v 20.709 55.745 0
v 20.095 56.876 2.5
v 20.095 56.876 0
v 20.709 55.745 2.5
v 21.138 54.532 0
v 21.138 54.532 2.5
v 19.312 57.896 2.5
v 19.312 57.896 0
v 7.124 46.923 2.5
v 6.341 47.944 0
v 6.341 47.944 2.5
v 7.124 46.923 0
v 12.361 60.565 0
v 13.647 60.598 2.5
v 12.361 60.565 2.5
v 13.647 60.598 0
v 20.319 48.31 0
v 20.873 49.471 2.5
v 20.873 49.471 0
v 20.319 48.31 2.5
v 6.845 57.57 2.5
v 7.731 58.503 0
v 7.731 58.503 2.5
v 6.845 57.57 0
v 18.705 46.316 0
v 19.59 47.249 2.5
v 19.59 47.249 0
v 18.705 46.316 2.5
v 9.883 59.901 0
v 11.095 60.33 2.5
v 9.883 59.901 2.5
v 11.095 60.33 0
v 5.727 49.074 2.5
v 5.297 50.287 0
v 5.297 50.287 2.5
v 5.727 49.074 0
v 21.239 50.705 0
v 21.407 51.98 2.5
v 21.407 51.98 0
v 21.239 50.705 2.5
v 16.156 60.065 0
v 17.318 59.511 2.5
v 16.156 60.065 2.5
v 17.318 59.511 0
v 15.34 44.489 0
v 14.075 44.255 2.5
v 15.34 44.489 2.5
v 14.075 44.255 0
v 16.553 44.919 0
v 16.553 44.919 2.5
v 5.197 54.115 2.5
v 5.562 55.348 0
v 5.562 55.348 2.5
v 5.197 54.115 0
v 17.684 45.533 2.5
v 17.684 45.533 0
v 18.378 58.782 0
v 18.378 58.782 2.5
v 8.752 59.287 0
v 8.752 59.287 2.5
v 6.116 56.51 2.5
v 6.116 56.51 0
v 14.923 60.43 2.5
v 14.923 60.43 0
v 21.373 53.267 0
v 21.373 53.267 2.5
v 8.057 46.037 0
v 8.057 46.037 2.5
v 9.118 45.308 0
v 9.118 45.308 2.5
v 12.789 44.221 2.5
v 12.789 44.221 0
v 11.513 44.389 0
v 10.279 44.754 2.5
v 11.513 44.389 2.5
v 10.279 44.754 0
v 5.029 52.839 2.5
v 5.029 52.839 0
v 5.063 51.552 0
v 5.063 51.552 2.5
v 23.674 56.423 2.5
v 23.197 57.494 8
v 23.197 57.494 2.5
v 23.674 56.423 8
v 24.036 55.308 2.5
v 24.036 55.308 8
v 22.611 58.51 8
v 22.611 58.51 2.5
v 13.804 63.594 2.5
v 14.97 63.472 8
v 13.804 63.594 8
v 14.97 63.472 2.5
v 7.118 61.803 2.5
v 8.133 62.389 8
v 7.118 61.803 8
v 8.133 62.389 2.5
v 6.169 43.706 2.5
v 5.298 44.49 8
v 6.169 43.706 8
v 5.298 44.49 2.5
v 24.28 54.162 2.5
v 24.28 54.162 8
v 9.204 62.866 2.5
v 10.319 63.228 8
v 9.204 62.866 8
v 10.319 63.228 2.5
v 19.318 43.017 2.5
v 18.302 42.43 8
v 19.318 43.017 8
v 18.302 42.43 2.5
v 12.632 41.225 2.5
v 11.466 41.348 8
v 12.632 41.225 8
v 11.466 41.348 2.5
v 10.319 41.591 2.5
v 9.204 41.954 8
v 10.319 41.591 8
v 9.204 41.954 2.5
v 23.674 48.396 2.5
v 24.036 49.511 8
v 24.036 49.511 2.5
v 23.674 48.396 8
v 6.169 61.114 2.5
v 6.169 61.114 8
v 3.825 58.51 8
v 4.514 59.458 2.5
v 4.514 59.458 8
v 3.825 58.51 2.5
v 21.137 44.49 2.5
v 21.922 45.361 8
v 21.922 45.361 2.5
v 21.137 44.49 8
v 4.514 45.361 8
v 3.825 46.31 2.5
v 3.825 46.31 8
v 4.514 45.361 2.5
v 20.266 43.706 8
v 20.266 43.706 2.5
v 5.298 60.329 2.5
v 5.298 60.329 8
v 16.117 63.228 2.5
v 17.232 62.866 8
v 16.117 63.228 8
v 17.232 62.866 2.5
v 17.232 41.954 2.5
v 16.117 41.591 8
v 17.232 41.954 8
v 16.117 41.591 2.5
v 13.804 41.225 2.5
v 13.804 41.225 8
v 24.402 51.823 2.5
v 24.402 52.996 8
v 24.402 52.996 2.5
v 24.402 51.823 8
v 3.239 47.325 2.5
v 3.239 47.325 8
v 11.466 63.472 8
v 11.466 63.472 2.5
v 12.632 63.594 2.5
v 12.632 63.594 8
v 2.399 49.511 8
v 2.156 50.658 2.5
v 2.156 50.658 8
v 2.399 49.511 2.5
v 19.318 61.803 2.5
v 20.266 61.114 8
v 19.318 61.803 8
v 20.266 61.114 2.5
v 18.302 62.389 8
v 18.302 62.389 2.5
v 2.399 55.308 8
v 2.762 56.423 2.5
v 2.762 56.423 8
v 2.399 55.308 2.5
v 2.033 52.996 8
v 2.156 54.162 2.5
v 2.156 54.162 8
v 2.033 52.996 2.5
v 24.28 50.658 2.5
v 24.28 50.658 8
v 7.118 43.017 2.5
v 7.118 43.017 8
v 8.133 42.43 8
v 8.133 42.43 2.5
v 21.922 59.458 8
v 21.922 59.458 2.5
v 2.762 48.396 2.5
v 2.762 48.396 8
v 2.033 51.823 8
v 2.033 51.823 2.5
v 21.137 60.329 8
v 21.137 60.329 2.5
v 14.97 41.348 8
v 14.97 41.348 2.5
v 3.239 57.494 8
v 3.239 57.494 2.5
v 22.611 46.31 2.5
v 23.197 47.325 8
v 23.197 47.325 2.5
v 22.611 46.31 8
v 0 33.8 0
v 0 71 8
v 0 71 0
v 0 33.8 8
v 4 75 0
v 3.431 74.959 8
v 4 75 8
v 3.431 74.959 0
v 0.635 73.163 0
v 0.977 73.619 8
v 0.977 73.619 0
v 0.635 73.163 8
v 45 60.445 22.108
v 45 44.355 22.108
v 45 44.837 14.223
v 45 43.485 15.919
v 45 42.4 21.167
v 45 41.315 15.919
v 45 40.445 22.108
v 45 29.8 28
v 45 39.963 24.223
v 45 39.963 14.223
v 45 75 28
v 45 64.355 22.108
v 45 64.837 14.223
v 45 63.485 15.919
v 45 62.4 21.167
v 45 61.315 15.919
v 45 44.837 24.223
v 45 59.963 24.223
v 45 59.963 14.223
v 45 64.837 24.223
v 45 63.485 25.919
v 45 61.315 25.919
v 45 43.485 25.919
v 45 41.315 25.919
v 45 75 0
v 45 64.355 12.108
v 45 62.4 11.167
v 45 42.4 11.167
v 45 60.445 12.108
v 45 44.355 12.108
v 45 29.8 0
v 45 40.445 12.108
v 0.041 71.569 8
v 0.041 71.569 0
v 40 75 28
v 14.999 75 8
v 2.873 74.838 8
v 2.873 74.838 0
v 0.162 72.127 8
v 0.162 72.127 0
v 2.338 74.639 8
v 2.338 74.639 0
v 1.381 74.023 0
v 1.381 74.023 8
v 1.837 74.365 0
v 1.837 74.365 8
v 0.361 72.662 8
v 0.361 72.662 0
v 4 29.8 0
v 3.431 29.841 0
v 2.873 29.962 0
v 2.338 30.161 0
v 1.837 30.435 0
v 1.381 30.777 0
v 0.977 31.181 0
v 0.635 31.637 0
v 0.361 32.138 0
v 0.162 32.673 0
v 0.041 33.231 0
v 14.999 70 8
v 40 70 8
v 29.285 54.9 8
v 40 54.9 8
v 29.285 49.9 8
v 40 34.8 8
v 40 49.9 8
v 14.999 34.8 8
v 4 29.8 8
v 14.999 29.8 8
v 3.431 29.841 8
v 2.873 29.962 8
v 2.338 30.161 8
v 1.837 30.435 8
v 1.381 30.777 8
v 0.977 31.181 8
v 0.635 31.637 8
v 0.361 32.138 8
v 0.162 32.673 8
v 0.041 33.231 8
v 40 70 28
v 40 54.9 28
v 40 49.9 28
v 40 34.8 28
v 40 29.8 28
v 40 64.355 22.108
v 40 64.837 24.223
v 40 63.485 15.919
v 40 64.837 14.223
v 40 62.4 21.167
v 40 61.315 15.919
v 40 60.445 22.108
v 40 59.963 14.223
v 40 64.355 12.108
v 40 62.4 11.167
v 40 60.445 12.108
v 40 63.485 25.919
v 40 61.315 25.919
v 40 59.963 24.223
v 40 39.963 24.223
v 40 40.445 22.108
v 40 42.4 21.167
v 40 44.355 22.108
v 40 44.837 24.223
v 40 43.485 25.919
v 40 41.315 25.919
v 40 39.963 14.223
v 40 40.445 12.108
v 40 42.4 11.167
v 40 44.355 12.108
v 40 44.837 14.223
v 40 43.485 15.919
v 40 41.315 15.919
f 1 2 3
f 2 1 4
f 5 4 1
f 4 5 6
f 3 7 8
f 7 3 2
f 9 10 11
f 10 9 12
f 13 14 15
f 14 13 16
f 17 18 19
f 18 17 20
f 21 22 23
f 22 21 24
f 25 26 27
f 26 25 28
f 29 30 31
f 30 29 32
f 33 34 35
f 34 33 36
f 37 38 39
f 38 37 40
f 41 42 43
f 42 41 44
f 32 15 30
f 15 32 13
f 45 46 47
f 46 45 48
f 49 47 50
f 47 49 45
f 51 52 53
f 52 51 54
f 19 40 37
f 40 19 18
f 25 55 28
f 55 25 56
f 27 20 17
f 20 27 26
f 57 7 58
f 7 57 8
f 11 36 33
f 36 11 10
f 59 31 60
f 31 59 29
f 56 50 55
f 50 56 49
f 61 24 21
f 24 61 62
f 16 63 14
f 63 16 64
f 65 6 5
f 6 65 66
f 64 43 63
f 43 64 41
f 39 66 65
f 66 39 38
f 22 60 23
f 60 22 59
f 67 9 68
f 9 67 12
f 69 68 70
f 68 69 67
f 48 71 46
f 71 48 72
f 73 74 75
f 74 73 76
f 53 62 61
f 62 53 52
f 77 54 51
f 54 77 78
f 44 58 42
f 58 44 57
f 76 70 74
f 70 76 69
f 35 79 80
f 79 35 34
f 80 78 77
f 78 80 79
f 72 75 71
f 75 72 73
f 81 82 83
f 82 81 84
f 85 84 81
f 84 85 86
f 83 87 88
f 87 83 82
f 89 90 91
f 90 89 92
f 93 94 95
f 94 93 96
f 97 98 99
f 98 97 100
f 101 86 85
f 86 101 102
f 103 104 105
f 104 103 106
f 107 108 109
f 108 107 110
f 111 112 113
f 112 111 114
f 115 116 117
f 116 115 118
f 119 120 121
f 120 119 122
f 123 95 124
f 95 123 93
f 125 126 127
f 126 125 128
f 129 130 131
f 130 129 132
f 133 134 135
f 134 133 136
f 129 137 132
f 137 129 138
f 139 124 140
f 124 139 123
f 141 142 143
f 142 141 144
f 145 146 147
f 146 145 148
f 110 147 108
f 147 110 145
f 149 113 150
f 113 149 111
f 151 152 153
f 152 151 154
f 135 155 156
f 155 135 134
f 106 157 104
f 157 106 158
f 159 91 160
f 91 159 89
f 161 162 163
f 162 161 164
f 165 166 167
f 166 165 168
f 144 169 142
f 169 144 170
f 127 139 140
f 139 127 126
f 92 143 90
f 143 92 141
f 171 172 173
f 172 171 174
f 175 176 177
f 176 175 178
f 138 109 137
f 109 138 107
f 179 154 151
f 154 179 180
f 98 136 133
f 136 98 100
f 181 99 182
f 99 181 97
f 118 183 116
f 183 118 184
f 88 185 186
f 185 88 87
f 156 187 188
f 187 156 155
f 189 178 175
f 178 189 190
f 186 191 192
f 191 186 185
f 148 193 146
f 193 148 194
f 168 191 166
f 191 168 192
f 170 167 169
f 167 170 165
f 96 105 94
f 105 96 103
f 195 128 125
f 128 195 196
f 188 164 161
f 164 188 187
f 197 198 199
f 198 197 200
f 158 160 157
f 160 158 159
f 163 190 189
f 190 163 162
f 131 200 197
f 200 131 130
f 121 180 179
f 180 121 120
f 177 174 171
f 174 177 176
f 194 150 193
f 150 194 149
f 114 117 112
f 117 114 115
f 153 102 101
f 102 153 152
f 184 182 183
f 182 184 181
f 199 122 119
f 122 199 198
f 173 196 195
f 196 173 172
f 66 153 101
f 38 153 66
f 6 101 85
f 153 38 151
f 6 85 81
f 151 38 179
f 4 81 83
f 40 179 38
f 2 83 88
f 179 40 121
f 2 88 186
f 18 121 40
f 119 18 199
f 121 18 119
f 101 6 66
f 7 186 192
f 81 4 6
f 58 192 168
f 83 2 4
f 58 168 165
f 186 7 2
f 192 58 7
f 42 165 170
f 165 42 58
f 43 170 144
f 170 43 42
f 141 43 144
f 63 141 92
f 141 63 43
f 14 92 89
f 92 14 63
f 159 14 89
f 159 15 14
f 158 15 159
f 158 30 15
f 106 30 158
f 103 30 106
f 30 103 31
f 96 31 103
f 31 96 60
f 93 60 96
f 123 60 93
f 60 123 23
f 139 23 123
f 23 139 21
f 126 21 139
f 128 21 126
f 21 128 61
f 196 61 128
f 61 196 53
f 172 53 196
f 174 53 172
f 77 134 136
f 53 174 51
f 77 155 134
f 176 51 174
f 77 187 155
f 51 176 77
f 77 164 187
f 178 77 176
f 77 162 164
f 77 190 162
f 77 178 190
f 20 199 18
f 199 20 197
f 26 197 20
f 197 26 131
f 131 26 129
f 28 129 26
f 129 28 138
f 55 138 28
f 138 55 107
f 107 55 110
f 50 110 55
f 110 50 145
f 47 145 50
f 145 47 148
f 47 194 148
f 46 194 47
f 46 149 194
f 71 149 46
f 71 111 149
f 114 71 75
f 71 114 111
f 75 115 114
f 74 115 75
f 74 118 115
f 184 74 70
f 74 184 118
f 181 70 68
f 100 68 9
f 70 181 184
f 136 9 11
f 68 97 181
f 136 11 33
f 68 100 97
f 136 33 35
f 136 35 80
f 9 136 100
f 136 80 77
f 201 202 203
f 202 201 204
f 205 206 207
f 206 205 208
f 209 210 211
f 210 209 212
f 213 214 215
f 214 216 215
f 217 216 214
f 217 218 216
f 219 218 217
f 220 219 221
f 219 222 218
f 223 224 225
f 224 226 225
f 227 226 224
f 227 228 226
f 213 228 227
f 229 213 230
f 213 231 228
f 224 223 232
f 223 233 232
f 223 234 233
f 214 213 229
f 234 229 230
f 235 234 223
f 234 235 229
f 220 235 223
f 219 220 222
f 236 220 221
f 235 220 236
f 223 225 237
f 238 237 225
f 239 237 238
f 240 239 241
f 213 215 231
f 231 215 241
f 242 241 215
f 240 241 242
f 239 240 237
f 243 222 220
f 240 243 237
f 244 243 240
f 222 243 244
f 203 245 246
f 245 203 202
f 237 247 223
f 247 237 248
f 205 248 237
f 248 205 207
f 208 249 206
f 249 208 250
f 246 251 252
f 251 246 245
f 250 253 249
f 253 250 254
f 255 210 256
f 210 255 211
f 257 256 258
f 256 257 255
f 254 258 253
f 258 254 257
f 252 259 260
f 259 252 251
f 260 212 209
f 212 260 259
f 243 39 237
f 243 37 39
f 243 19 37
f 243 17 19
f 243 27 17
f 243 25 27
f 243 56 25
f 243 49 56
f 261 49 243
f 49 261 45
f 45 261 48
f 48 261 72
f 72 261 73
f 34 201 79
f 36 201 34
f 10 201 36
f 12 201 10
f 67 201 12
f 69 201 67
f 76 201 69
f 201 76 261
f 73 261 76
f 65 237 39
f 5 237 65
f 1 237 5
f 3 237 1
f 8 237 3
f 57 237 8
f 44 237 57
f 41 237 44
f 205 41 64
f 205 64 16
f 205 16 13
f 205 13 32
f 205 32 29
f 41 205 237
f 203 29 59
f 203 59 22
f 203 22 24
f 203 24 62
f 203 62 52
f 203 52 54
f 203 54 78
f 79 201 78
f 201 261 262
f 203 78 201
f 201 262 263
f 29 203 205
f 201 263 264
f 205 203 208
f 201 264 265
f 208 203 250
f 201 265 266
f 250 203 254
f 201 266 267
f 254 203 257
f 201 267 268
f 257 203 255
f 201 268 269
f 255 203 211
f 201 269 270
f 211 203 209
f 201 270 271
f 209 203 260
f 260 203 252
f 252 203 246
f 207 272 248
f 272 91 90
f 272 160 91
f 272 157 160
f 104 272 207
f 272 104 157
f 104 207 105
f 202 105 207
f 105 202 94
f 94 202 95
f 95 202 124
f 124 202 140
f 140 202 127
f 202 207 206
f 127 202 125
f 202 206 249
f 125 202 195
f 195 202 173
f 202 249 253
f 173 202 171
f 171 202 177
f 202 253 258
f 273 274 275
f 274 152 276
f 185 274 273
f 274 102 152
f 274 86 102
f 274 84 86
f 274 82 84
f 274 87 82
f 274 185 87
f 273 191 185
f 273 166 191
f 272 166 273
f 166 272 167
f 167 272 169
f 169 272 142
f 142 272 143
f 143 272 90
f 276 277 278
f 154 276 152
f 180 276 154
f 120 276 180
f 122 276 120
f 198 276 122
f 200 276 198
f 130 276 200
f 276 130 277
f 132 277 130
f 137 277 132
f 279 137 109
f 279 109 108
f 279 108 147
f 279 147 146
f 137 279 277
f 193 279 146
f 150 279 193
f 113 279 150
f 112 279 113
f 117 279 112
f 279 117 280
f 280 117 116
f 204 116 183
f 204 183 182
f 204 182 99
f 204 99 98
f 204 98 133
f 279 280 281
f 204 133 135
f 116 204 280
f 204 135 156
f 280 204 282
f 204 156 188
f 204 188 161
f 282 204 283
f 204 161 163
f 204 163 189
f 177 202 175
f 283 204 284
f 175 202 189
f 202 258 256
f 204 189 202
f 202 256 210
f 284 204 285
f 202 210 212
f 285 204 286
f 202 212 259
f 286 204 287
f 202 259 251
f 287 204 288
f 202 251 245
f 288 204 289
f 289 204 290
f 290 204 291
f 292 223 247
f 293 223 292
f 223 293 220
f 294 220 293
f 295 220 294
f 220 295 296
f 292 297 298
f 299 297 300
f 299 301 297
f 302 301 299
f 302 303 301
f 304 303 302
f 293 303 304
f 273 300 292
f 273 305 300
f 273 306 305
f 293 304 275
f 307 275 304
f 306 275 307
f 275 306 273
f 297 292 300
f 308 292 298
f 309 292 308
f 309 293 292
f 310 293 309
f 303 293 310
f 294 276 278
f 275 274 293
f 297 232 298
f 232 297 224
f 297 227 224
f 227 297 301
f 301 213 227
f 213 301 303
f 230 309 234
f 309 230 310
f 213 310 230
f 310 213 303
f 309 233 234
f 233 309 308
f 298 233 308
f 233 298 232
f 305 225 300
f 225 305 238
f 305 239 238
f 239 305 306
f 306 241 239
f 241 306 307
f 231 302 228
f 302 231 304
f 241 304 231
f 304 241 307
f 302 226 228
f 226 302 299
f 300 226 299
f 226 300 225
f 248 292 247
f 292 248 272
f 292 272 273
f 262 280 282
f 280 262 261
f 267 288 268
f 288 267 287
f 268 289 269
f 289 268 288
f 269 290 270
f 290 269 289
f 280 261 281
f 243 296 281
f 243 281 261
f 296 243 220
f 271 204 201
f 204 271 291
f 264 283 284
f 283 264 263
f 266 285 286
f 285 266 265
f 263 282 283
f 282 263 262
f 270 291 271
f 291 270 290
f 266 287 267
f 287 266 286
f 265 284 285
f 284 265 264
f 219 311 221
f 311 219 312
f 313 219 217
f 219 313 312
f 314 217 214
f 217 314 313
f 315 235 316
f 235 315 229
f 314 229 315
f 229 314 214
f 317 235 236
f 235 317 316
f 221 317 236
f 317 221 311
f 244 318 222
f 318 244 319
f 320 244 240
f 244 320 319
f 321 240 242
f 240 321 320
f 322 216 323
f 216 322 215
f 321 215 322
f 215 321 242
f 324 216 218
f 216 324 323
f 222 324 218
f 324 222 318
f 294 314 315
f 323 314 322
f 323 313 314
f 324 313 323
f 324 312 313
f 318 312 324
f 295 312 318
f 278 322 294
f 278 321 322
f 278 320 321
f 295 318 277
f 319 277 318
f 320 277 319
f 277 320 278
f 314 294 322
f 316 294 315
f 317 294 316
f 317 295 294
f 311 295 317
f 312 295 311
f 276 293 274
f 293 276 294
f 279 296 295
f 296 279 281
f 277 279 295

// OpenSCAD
// file: ../libs/utils/build_plate.scad
// Minimal build plate helper for browser customizer builds.
module build_plate(build_plate_selector=0, build_plate_manual_x=100, build_plate_manual_y=100) {
  // intentionally no-op in browser preview
}
// file: ../Gears/motor_gear.scad
/* Derived by Carlosgs from:
 * http://www.thingiverse.com/thing:12789
 * An extruder gear set for the TechZone Huxley,
 *  featuring Herringbone teeth.
 * You will have to recalibrate your E_STEPS_PER_MM in
 *  your firmware (ratio changing from original techzone
 *  lasercut gears).
 * This use 2 modules from the MCAD library that you can
 *  get from https://github.com/elmom/MCAD.
 * 
 * Part - the motor gear mount hub with set screw hole -
 *  derived from http://www.thingiverse.com/thing:3104
 *  (thanks GilesBathgate) which is under GPL CC license.
 *
 * Copyright (C) 2011  Guy 'DeuxVis' P.
 *
 * August 2013 added 2 extra setscrews to ensure centered usage.
 * by Harry Binnema. 
 *
 * This program is free software; you can redistribute it and/or
 * modify it under the terms of the GNU General Public License
 * as published by the Free Software Foundation; either version 2
 * of the License, or (at your option) any later version.
 * 
 * This program is distributed in the hope that it will be useful,
 * but WITHOUT ANY WARRANTY; without even the implied warranty of
 * MERCHANTABILITY or FITNESS FOR A PARTICULAR PURPOSE.  See the
 * GNU General Public License for more details.

 * You should have received a copy of the GNU General Public License
 * along with this program; if not, write to the Free Software
 * Foundation, Inc., 51 Franklin Street, Fifth Floor, Boston, MA  02110-1301, USA.
 * -- 
 *     DeuxVis - device@ymail.com */

include <MCAD/materials.scad>
include <MCAD/teardrop.scad>
include <MCAD/involute_gears.scad>

motor_shaft_diameter=5.4;
BigGear_N_Teeth = 21; // 24

nholes = 9; // 7
holes_diam = 6;
hole_distance_from_center = 13.5-4.5+holes_diam/2;

/* Herringbone gear module, adapted from MCAD/involute_gears */
module herringbone_gear( teeth=12, circles=0, shaft=5 ) {
  twist=200;
  height=10;
  pressure_angle=30;

  gear(
    number_of_teeth=teeth,
    circular_pitch=320,
		pressure_angle=pressure_angle,
		clearance = 0.2,
		gear_thickness = height/2,
		rim_thickness = height/2,
		rim_width = 1,
		hub_thickness = height/2,
		hub_diameter=1,
		bore_diameter=shaft,
		circles=circles,
		twist=twist/teeth
  );

	mirror( [0,0,1] )
	  gear(
      number_of_teeth=teeth,
		  circular_pitch=320,
		  pressure_angle=pressure_angle,
		  clearance = 0.2,
		  gear_thickness = height/2,
		  rim_thickness = height/2,
		  rim_width = 1,
		  hub_thickness = height/2,
		  hub_diameter=1,
		  bore_diameter=shaft,
		  circles=circles,
		  twist=twist/teeth
    );
}

module cyclone_motor_gear(with_extra_parts=false, exploded=false) {
// Motor gear
union() difference() {	 
  union() {

    //gear
    herringbone_gear( teeth=BigGear_N_Teeth );

    translate( [0, 0, 12] ) mirror( [0, 0, 1] ) difference() {
      //shaft
      cylinder( r=9, h=15, $fn=40 );
	//adapted to include 3 captive nuts for symmetrical positioning
	//adpted bij HJ Binnema on August 26 2013.
	for (i= [0:2]){
		rotate([0,0,i*120]){
      //captive nut and grub holes
      translate( [0, 20, 3.5] ) rotate( [90, 0, 0] ) union() {
        //enterance
        translate( [0, -3, 14.5] ) cube( [6, 6, 2.6], center=true );
        //nut
        translate( [0, 0, 13.3] ) rotate( [0, 0, 30] )
          cylinder( r=6/2+0.5, h=2.6, $fn=6 );
        //grub hole
        translate( [0, 0, 9] ) cylinder( r=3.2/2, h=10, $fn=6 );
      }}}
    }
  }

  //holes to save plastic
  for(i=[0:nholes-1])
    rotate( [0, 0, i*360/(nholes)+45], $fn=20 )
      translate( [hole_distance_from_center, 0] )
        cylinder( r=holes_diam/2, h=11, center=true, $fn=30 );

  //shaft hole
  translate( [0, 0, -6] ) cylinder( r=motor_shaft_diameter/2, h=20, $fn=30 );
}


  if(with_extra_parts)
    cyclone_motor_gear_extras(exploded_distance=(exploded?20:0));

  module cyclone_motor_gear_extras(exploded_distance=0) {
    echo("Non-Plastic Parts, 1, Grub Screw M3 x 8 mm to attach gear to motor shaft");
    translate([0,2.5+8+exploded_distance,12-3.5])
      rotate([90, 0, 0])
        color(Steel) cylinder(r=1.5, h=8, $fn=30);
  }
}


cyclone_motor_gear();
// file: ../Gears/rod_gear.scad
/* Derived by Carlosgs from:
 * http://www.thingiverse.com/thing:12789
 * An extruder gear set for the TechZone Huxley,
 *  featuring Herringbone teeth.
 * You will have to recalibrate your E_STEPS_PER_MM in
 *  your firmware (ratio changing from original techzone
 *  lasercut gears).
 * This use 2 modules from the MCAD library that you can
 *  get from https://github.com/elmom/MCAD.
 * 
 * Part - the motor gear mount hub with set screw hole -
 *  derived from http://www.thingiverse.com/thing:3104
 *  (thanks GilesBathgate) which is under GPL CC license.
 *
 * Copyright (C) 2011  Guy 'DeuxVis' P.
 *
 * This program is free software; you can redistribute it and/or
 * modify it under the terms of the GNU General Public License
 * as published by the Free Software Foundation; either version 2
 * of the License, or (at your option) any later version.
 * 
 * This program is distributed in the hope that it will be useful,
 * but WITHOUT ANY WARRANTY; without even the implied warranty of
 * MERCHANTABILITY or FITNESS FOR A PARTICULAR PURPOSE.  See the
 * GNU General Public License for more details.

 * You should have received a copy of the GNU General Public License
 * along with this program; if not, write to the Free Software
 * Foundation, Inc., 51 Franklin Street, Fifth Floor, Boston, MA  02110-1301, USA.
 * -- 
 *     DeuxVis - device@ymail.com */

include <MCAD/metric_fastners.scad>
include <MCAD/materials.scad>
include <MCAD/teardrop.scad>
include <MCAD/involute_gears.scad>

M8_nut_diameter = 15.3;
nut_separation = 3;

SmallGear_N_Teeth = 15; // 12
M8_rod_diam = 8.4;

/* Herringbone gear module, adapted from MCAD/involute_gears */
module herringbone_gear( teeth=12, circles=0, shaft=5 ) {
  twist=200;
  height=10;
  pressure_angle=30;

  gear(
    number_of_teeth=teeth,
    circular_pitch=320,
		pressure_angle=pressure_angle,
		clearance = 0.2,
		gear_thickness = height/2,
		rim_thickness = height/2,
		rim_width = 1,
		hub_thickness = height/2,
		hub_diameter=1,
		bore_diameter=shaft,
		circles=circles,
		twist=twist/teeth
  );

	mirror( [0,0,1] )
	  gear(
      number_of_teeth=teeth,
		  circular_pitch=320,
		  pressure_angle=pressure_angle,
		  clearance = 0.2,
		  gear_thickness = height/2,
		  rim_thickness = height/2,
		  rim_width = 1,
		  hub_thickness = height/2,
		  hub_diameter=1,
		  bore_diameter=shaft,
		  circles=circles,
		  twist=twist/teeth
    );
}

module cyclone_rod_gear(with_extra_parts=false, exploded=false) {
// Extruder Gear
difference() {
  union() {
    //gear
    rotate([180,0,0]) herringbone_gear( teeth=SmallGear_N_Teeth, circles=0, shaft=M8_rod_diam, $fn=40 );

    //M8 hobbed bolt head fit washer
    /*difference() {
      translate( [0, 0, 5] ) cylinder( r=8, h=3, $fn=60 );
      translate( [0, 0, 5-0.01] ) cylinder( r=M8_nut_diameter/2, h=7, $fn=6 );
    }*/
    /*rotate([180,0,0]) difference() {
      translate( [0, 0, 5] ) cylinder( r=13, h=3, $fn=60 );
      translate( [0, 0, 5+0.4] ) cylinder( r=M8_nut_diameter/2, h=7, $fn=6 );
    }*/
  }

  translate( [0, 0, (nut_separation/2)] ) cylinder( r=M8_nut_diameter/2, h=7, $fn=6 );
}

  if(with_extra_parts)
    cyclone_rod_gear_extras(exploded_distance=(exploded?12:0));

  module cyclone_rod_gear_extras(exploded_distance=0) {
    echo("Non-Plastic Parts, 2, Nut M8 to attach rod_gear on threaded rod");
    translate([0,0,-10/2-0.8*8-1.0*exploded_distance]) color(Steel) flat_nut(8);
    translate([0,0,nut_separation/2+0.8*8+1.0*exploded_distance]) rotate([180,0,0]) color(Steel) flat_nut(8);
  }

}

cyclone_rod_gear();
// file: ../libs/build_plate.scad
//use this to include a build plate visualization in your openSCAD scripts. Very useful for things designed to be edited in Makerbot Customizer

//to use, either include or use <utils/build_plate.scad>

//then just call build_plate(); with the following arguments (also, you have to have a real object in your scene for this to render)

//putting 0 as the first argument will give you a Replicator 2 build plate
//putting 1 as the first argument will give you a Replicator 1 build plate
//putting 2 as the first argument will give you a Thingomatic build plate
//putting 3 as the first argument will give you a manually adjustable build plate (note: if you use this option, you need to specify your build plates X length (in mm) as the second argument and the Y length (in mm) as the third argument. eg. build_plate(3,150,120);)

/*

to give your user control of which build plate they see in Customizer, include the following code:

use <utils/build_plate.scad>

//for display only, doesn't contribute to final object
build_plate_selector = 0; //[0:Replicator 2,1: Replicator,2:Thingomatic,3:Manual]
//when Build Plate Selector is set to "manual" this controls the build plate x dimension
build_plate_manual_x = 100; //[100:400]
//when Build Plate Selector is set to "manual" this controls the build plate y dimension
build_plate_manual_y = 100; //[100:400]

build_plate(build_plate_selector,build_plate_manual_x,build_plate_manual_y);

*/




//to see how this works, uncomment the following code

//build_plate_selector = 0; //[0:Replicator 2,1: Replicator,2:Thingomatic,3:Manual]
//build_plate_manual_x = 100; //[100:400]
//build_plate_manual_y = 100; //[100:400]
//
//build_plate(build_plate_selector,build_plate_manual_x,build_plate_manual_y);
//
//cube(5);


module build_plate(bp,manX,manY){

		translate([0,0,-.52]){
			if(bp == 0){
				%cube([285,153,1],center = true);
			}
			if(bp == 1){
				%cube([225,145,1],center = true);
			}
			if(bp == 2){
				%cube([120,120,1],center = true);
			}
			if(bp == 3){
				%cube([manX,manY,1],center = true);
			}
		
		}
		translate([0,0,-.5]){
			if(bp == 0){
				for(i = [-14:14]){
					translate([i*10,0,0])
					%cube([.5,153,1.01],center = true);
				}
				for(i = [-7:7]){
					translate([0,i*10,0])
					%cube([285,.5,1.01],center = true);
				}	
			}
			if(bp == 1){
				for(i = [-11:11]){
					translate([i*10,0,0])
						%cube([.5,145,1.01],center = true);
				}
				for(i = [-7:7]){
					translate([0,i*10,0])
						%cube([225,.5,1.01],center = true);
				}
			}
			if(bp == 2){
				for(i = [-6:6]){
					translate([i*10,0,0])
						%cube([.5,120,1.01],center = true);
				}
				for(i = [-6:6]){
					translate([0,i*10,0])
						%cube([120,.5,1.01],center = true);
				}
			}
			if(bp == 3){
				for(i = [-(floor(manX/20)):floor(manX/20)]){
					translate([i*10,0,0])
						%cube([.5,manY,1.01],center = true);
				}
				for(i = [-(floor(manY/20)):floor(manY/20)]){
					translate([0,i*10,0])
						%cube([manX,.5,1.01],center = true);
				}
			}
		}
}
// file: ../libs/obiscad/bcube.scad
//------------------------------------------------------------------------------
//  Bevel edge cube.
//  (c) Juan Gonzalez-Gomez (Obijuan), Sep-2012
//------------------------------------------------------------------------------

//----------------- IMPLEMENTATION USING THE MINKOWSKI OPERATOR ----------------

//------------------------------------------------------------------------------
//-- Bevel Cube main function
//-- Parameters:
//--   * Size:  Cube size
//--   * cr : Corner radius (if cr==0, a standar cube is built)
//--   * cres:  Corner resolution (in points). cres=0 means flat corners
//------------------------------------------------------------------------------
module bcube(size,cr=0,cres=0)
{
  //-- Internal cube size
  bsize = size - 2*[cr,cr,0];

  //-- Get the (x,y) coorner coordinates in the 1st cuadrant
  x = bsize[0]/2;
  y = bsize[1]/2;

  //-- A corner radius of 0 means a standar cube!
  if (cr==0)
    cube(bsize,center=true);
  else {

      
      //-- The height of minkowski object is double. So
      //-- we sould scale by 0.5
      scale([1,1,0.5])

      //-- This translation is for centering the minkowski objet
      translate([-x, -y,0])

      //-- Built the  beveled cube with minkowski
      minkowski() {

        //-- Internal cube
        cube(bsize,center=true);

        //-- Cylinder in the corner (1st cuadrant)
        translate([x,y, 0])
          cylinder(r=cr, h=bsize[2],center=true, $fn=4*(cres+1));
      }
  }

}


//-- Examples of use of the bcube() module

//-- Standar cube
translate([-15,15,0])
bcube([20,20,10]);

//-- Beveled cube (0 point resolution)
translate([15,15,0])
  bcube([20,20,10],cr=4);

//-- Beveled cube (1 point resolution)
translate([-15,-15,0])
  bcube([20,20,10],cr=4, cres=1);

//-- Beveled cube (4 points resolution)
translate([15,-15,0])
  bcube([20,20,10],cr=4, cres=4);
// main file
// Cyclone PCB Factory: a 3D printable CNC machine for PCB manufacture
// Created by Carlosgs (http://carlosgs.es)
// License: Attribution - Share Alike - Creative Commons (http://creativecommons.org/licenses/by-sa/3.0/)
// History:
//  - (05/25/2013) Added @yopero's four screw suggestion for the motor stand
//  - (05/28/2013) Added @yopero's four screw suggestion for the idle stand

include <MCAD/stepper.scad>
include <MCAD/bearing.scad>
include <MCAD/metric_fastners.scad>
include <MCAD/nuts_and_bolts.scad>
include <MCAD/materials.scad>
use <../libs/obiscad/bcube.scad>
use <../libs/build_plate.scad>
use <../Gears/rod_gear.scad>
use <../Gears/motor_gear.scad>

motor_width = 43;
motor_length = 49; // not used
motor_screw_distance = 31.3;
motor_center_diameter = 23;

motor_screw_diameter = 3.7;
motor_screw_head_diameter = 8;

motor_adjust_margin = 3;

bearing_diameter = 22.4;
M8_rod_diameter = 8.2;

axis_distance = 32;

wall_thickness = 8;
wall_height = 45;
wall_width = 70;

idler_width = 25;



// For the supports with screws
bottom_thickness = 5;
base_width = 20;
base_length = 20+wall_thickness;
base_screw_diameter = 5;



wall_extraWidth_left = base_width+5;
wall_extraWidth_right = 5;

totalWallWidth = wall_width+wall_extraWidth_left+wall_extraWidth_right;

Cyclone_Nema17 = [
                [NemaModel, 17],
                [NemaLengthShort, 33*mm],
                [NemaLengthMedium, 39*mm],
                [NemaLengthLong, 48*mm],
                [NemaSideSize, 42.30*mm],
                [NemaDistanceBetweenMountingHoles, 31.0*mm],
                [NemaMountingHoleDiameter, 4*mm],
                [NemaMountingHoleDepth, 5.5*mm], //actual is 4.5mm, motor() module is generating 1mm short
                [NemaMountingHoleLip, -1*mm],
                [NemaMountingHoleCutoutRadius, 0*mm],
                [NemaEdgeRoundingRadius, 7*mm],
                [NemaRoundExtrusionDiameter, 22*mm],
                [NemaRoundExtrusionHeight, 1.9*mm],
                [NemaAxleDiameter, 5*mm],
                [NemaFrontAxleLength, 24*mm],
                [NemaBackAxleLength, 15*mm],
                [NemaAxleFlatDepth, 0.5*mm],
                [NemaAxleFlatLengthFront, 15*mm],
                [NemaAxleFlatLengthBack, 14*mm]
         ];


module motorHolesY() {
    // Hole for the motor shaft
    hull() {
      translate([0,motor_adjust_margin/2,0])
        cylinder(r=motor_center_diameter/2,h=10*wall_thickness,center=true,$fn=40);
      translate([0,-motor_adjust_margin/2,0])
        cylinder(r=motor_center_diameter/2,h=10*wall_thickness,center=true,$fn=40);
    }

    // Hole for the screwdriver
    translate([-wall_height/2,0,wall_thickness/2]) rotate([0,90,0]) bcube([2*(wall_thickness-5),5,wall_height],cr=1);

    // Screws for holding the motor
    for(i=[-1,1]) for(j=[-1,1])
    translate([i*motor_screw_distance/2,j*motor_screw_distance/2,2.5-wall_thickness/2]) {
      hull() {
        translate([0,motor_adjust_margin/2,0])
          cylinder(r=motor_screw_diameter/2,h=10*wall_thickness,center=true,$fn=40);
        translate([0,-motor_adjust_margin/2,0])
          cylinder(r=motor_screw_diameter/2,h=10*wall_thickness,center=true,$fn=40);
      }
      hull() {
        translate([0,motor_adjust_margin/2,0])
          cylinder(r=motor_screw_head_diameter/2,h=10*wall_thickness,center=false,$fn=40);
        translate([0,-motor_adjust_margin/2,0])
          cylinder(r=motor_screw_head_diameter/2,h=10*wall_thickness,center=false,$fn=40);
      }
    }
}

module motor_stand_no_base_extras(with_motor=false, exploded_distance=0) {
  // --- additional parts for assembly instruction ---
  if(with_motor) {
    translate([motor_width/2,motor_width/2,0]) {
      rotate([0,180,0])
        translate([0,0,-1+exploded_distance])
          motor(Cyclone_Nema17, NemaLengthLong);
	  echo("Non-Plastic Parts, 1, Nema 17 for Y axis");

      // --- Motor Gear ---
      translate([0,0,12+5.5+exploded_distance])
        rotate([180, 0, -90])
          cyclone_motor_gear(with_extra_parts=true, exploded=(exploded_distance!=0));
    }

    translate([motor_width/2,motor_width/2,wall_thickness/2]) {
      rotate([0,0,15]) translate([0,axis_distance,2.5-wall_thickness/2]) {
        echo("Non-Plastic Parts, 1, Bearing 608 for motor stand");
        translate([0,0,0.5*exploded_distance])
          bearing(model=608);

        // --- Rod Gear ---
        translate([0,0,1.5-wall_thickness/2+5+2.5+7+3+1.5*exploded_distance])
          rotate([0,180,15])
            cyclone_rod_gear(with_extra_parts=true, exploded=(exploded_distance!=0));
      }
    }

    echo("Non-Plastic Parts, 4, Bolt M3 x 6 mm to attach motor on motor_stand");
    for(i=[-1,1]) for(j=[-1,1])
      translate([motor_width/2,motor_width/2,wall_thickness/2])
        translate([i*motor_screw_distance/2,j*motor_screw_distance/2,2.5-wall_thickness/2+exploded_distance*0.7]) {
          rotate([0,180,0]) color(Steel) boltHole(size=3, length=6);
    }
  }

  if(!with_motor) {
    translate([motor_width/2,motor_width/2,wall_thickness/2])
      rotate([0,0,15]) translate([0,axis_distance,2.5-wall_thickness/2]) color(Steel) {
        echo("Non-Plastic Parts, 1, Bearing 608 for idle stand");
        translate([0,0,0.3*exploded_distance]) bearing(model=608);

        echo("Non-Plastic Parts, 1, Washer M8 for idle stand");
        translate([0,0,7+0.6*exploded_distance]) washer(8);

        echo("Non-Plastic Parts, 1, Nut M8 to attach threaded rod on idle stand");
        translate([0,0,6.4+7+0.8+0.9*exploded_distance]) rotate([0,180,0]) flat_nut(8);
      }
  }
}

module motor_stand_no_base(with_motor=true, with_extra_parts=false, exploded=false) {

  if(with_extra_parts)
    motor_stand_no_base_extras(with_motor=with_motor, exploded_distance=(exploded?30:0));

difference() {
  translate([wall_height/2,totalWallWidth/2-wall_extraWidth_left,wall_thickness/2])
    bcube([wall_height,totalWallWidth,wall_thickness],cr=4,cres=10);

  // Position relative to motor shaft
  translate([motor_width/2,motor_width/2,wall_thickness/2]) {

    if(with_motor)
      motorHolesY();

    // Bearing holes
    rotate([0,0,15]) translate([0,axis_distance,2.5-wall_thickness/2]) {
      cylinder(r=(M8_rod_diameter*2)/2,h=10*wall_thickness,center=true,$fn=40);
      cylinder(r=bearing_diameter/2,h=10*wall_thickness,center=false,$fn=60);
    }

  } // End of translate relative to motor shaft
} // End of difference
}

module holder(h=35,noScrews=false,base_width_inc=0, with_extra_parts=false, exploded=false) {
    difference() {
      union() {
        translate([wall_height-bottom_thickness,0]) {
          if(!noScrews) cube([bottom_thickness,base_width+base_width_inc,base_length]);
          hull() {
            cube([bottom_thickness,5,base_length]);
            translate([-h,0,0])
              cube([0.001,5,0.001]);
          }
        }
      }
      // --- screws for the base ---
      if(!noScrews) translate([wall_height,base_width/2+2.5,base_length/1.5])
        rotate([0,90,0]) {
          translate([-5,0,0])
            cylinder(r=base_screw_diameter/2,h=100,center=true,$fn=7);
          translate([5,0,0])
            cylinder(r=base_screw_diameter/2,h=100,center=true,$fn=7);
        }
    } // End of difference
}

module motor_stand(with_motor=true, with_extra_parts=false, exploded=false) {
  union() {
    motor_stand_no_base(with_motor=with_motor, with_extra_parts=with_extra_parts, exploded=exploded);
    translate([0,wall_width]) holder(noScrews=true, with_extra_parts=false, exploded=exploded);
    translate([0,52.4-5/2]) holder(h=12,base_width_inc=1, with_extra_parts=with_extra_parts, exploded=exploded);
    translate([0,-wall_extraWidth_left+base_width]) scale([1,-1,1]) holder(with_extra_parts=with_extra_parts, exploded=exploded);
  }
  if(with_extra_parts && with_motor) {
    translate([0,52.4-5/2])
      idle_stand_extras(exploded_distance=(exploded?17:0));
    translate([0,-wall_extraWidth_left+base_width]) scale([1,-1,1])
      idle_stand_extras(exploded_distance=(exploded?17:0));
  }
}


module idle_stand(with_extra_parts=false, exploded=false) {
	union() {
		intersection() { // Remove the motor part
			motor_stand(with_motor=false, with_extra_parts=with_extra_parts, exploded=exploded);
           union() {
			  translate([wall_height/2,wall_width/2+52.4-(wall_width+wall_extraWidth_right-52.4),wall_thickness/2])
			    bcube([wall_height,wall_width,100],cr=4,cres=10);
			  translate([wall_height/2,wall_width/2+52.4-(wall_width+wall_extraWidth_right-52.4),wall_thickness/2])
			    bcube([wall_height*2,wall_width/6,100],cr=4,cres=10); //keep self tapping screw
           }
		}
		translate([0,wall_width+5-2*(wall_width+wall_extraWidth_right-52.4)]) holder(noScrews=true, with_extra_parts=with_extra_parts, exploded=exploded);
		translate([0,52.4+5/2]) scale([1,-1,1]) holder(h=15,base_width_inc=1, with_extra_parts=with_extra_parts, exploded=exploded);
	}

  if(with_extra_parts) {
    translate([0,wall_width+5-2*(wall_width+wall_extraWidth_right-52.4)])
      idle_stand_extras(exploded_distance=(exploded?17:0));
    translate([0,52.4-5/2, 0])
      idle_stand_extras(exploded_distance=(exploded?17:0));
  }
}

module idle_stand_extras(exploded_distance=0) {
  screw_size = 2.9;
  screw_length = 16;
  echo("Non-Plastic Parts, 2, Self Tapping Screw 2.9 x 16 mm for motor_stand");
  translate([wall_height,base_width/2+2.5,base_length/1.5]) color(Steel)
    rotate([0,90,0]) {
      translate([-5,0,-bottom_thickness-.2-exploded_distance])
        csk_bolt(screw_size, screw_length);
      translate([5,0,-bottom_thickness-.2-exploded_distance])
        csk_bolt(screw_size, screw_length);
    }
}

//for display only, doesn't contribute to final object
build_plate(3,200,200);

//motor_stand();
idle_stand();
